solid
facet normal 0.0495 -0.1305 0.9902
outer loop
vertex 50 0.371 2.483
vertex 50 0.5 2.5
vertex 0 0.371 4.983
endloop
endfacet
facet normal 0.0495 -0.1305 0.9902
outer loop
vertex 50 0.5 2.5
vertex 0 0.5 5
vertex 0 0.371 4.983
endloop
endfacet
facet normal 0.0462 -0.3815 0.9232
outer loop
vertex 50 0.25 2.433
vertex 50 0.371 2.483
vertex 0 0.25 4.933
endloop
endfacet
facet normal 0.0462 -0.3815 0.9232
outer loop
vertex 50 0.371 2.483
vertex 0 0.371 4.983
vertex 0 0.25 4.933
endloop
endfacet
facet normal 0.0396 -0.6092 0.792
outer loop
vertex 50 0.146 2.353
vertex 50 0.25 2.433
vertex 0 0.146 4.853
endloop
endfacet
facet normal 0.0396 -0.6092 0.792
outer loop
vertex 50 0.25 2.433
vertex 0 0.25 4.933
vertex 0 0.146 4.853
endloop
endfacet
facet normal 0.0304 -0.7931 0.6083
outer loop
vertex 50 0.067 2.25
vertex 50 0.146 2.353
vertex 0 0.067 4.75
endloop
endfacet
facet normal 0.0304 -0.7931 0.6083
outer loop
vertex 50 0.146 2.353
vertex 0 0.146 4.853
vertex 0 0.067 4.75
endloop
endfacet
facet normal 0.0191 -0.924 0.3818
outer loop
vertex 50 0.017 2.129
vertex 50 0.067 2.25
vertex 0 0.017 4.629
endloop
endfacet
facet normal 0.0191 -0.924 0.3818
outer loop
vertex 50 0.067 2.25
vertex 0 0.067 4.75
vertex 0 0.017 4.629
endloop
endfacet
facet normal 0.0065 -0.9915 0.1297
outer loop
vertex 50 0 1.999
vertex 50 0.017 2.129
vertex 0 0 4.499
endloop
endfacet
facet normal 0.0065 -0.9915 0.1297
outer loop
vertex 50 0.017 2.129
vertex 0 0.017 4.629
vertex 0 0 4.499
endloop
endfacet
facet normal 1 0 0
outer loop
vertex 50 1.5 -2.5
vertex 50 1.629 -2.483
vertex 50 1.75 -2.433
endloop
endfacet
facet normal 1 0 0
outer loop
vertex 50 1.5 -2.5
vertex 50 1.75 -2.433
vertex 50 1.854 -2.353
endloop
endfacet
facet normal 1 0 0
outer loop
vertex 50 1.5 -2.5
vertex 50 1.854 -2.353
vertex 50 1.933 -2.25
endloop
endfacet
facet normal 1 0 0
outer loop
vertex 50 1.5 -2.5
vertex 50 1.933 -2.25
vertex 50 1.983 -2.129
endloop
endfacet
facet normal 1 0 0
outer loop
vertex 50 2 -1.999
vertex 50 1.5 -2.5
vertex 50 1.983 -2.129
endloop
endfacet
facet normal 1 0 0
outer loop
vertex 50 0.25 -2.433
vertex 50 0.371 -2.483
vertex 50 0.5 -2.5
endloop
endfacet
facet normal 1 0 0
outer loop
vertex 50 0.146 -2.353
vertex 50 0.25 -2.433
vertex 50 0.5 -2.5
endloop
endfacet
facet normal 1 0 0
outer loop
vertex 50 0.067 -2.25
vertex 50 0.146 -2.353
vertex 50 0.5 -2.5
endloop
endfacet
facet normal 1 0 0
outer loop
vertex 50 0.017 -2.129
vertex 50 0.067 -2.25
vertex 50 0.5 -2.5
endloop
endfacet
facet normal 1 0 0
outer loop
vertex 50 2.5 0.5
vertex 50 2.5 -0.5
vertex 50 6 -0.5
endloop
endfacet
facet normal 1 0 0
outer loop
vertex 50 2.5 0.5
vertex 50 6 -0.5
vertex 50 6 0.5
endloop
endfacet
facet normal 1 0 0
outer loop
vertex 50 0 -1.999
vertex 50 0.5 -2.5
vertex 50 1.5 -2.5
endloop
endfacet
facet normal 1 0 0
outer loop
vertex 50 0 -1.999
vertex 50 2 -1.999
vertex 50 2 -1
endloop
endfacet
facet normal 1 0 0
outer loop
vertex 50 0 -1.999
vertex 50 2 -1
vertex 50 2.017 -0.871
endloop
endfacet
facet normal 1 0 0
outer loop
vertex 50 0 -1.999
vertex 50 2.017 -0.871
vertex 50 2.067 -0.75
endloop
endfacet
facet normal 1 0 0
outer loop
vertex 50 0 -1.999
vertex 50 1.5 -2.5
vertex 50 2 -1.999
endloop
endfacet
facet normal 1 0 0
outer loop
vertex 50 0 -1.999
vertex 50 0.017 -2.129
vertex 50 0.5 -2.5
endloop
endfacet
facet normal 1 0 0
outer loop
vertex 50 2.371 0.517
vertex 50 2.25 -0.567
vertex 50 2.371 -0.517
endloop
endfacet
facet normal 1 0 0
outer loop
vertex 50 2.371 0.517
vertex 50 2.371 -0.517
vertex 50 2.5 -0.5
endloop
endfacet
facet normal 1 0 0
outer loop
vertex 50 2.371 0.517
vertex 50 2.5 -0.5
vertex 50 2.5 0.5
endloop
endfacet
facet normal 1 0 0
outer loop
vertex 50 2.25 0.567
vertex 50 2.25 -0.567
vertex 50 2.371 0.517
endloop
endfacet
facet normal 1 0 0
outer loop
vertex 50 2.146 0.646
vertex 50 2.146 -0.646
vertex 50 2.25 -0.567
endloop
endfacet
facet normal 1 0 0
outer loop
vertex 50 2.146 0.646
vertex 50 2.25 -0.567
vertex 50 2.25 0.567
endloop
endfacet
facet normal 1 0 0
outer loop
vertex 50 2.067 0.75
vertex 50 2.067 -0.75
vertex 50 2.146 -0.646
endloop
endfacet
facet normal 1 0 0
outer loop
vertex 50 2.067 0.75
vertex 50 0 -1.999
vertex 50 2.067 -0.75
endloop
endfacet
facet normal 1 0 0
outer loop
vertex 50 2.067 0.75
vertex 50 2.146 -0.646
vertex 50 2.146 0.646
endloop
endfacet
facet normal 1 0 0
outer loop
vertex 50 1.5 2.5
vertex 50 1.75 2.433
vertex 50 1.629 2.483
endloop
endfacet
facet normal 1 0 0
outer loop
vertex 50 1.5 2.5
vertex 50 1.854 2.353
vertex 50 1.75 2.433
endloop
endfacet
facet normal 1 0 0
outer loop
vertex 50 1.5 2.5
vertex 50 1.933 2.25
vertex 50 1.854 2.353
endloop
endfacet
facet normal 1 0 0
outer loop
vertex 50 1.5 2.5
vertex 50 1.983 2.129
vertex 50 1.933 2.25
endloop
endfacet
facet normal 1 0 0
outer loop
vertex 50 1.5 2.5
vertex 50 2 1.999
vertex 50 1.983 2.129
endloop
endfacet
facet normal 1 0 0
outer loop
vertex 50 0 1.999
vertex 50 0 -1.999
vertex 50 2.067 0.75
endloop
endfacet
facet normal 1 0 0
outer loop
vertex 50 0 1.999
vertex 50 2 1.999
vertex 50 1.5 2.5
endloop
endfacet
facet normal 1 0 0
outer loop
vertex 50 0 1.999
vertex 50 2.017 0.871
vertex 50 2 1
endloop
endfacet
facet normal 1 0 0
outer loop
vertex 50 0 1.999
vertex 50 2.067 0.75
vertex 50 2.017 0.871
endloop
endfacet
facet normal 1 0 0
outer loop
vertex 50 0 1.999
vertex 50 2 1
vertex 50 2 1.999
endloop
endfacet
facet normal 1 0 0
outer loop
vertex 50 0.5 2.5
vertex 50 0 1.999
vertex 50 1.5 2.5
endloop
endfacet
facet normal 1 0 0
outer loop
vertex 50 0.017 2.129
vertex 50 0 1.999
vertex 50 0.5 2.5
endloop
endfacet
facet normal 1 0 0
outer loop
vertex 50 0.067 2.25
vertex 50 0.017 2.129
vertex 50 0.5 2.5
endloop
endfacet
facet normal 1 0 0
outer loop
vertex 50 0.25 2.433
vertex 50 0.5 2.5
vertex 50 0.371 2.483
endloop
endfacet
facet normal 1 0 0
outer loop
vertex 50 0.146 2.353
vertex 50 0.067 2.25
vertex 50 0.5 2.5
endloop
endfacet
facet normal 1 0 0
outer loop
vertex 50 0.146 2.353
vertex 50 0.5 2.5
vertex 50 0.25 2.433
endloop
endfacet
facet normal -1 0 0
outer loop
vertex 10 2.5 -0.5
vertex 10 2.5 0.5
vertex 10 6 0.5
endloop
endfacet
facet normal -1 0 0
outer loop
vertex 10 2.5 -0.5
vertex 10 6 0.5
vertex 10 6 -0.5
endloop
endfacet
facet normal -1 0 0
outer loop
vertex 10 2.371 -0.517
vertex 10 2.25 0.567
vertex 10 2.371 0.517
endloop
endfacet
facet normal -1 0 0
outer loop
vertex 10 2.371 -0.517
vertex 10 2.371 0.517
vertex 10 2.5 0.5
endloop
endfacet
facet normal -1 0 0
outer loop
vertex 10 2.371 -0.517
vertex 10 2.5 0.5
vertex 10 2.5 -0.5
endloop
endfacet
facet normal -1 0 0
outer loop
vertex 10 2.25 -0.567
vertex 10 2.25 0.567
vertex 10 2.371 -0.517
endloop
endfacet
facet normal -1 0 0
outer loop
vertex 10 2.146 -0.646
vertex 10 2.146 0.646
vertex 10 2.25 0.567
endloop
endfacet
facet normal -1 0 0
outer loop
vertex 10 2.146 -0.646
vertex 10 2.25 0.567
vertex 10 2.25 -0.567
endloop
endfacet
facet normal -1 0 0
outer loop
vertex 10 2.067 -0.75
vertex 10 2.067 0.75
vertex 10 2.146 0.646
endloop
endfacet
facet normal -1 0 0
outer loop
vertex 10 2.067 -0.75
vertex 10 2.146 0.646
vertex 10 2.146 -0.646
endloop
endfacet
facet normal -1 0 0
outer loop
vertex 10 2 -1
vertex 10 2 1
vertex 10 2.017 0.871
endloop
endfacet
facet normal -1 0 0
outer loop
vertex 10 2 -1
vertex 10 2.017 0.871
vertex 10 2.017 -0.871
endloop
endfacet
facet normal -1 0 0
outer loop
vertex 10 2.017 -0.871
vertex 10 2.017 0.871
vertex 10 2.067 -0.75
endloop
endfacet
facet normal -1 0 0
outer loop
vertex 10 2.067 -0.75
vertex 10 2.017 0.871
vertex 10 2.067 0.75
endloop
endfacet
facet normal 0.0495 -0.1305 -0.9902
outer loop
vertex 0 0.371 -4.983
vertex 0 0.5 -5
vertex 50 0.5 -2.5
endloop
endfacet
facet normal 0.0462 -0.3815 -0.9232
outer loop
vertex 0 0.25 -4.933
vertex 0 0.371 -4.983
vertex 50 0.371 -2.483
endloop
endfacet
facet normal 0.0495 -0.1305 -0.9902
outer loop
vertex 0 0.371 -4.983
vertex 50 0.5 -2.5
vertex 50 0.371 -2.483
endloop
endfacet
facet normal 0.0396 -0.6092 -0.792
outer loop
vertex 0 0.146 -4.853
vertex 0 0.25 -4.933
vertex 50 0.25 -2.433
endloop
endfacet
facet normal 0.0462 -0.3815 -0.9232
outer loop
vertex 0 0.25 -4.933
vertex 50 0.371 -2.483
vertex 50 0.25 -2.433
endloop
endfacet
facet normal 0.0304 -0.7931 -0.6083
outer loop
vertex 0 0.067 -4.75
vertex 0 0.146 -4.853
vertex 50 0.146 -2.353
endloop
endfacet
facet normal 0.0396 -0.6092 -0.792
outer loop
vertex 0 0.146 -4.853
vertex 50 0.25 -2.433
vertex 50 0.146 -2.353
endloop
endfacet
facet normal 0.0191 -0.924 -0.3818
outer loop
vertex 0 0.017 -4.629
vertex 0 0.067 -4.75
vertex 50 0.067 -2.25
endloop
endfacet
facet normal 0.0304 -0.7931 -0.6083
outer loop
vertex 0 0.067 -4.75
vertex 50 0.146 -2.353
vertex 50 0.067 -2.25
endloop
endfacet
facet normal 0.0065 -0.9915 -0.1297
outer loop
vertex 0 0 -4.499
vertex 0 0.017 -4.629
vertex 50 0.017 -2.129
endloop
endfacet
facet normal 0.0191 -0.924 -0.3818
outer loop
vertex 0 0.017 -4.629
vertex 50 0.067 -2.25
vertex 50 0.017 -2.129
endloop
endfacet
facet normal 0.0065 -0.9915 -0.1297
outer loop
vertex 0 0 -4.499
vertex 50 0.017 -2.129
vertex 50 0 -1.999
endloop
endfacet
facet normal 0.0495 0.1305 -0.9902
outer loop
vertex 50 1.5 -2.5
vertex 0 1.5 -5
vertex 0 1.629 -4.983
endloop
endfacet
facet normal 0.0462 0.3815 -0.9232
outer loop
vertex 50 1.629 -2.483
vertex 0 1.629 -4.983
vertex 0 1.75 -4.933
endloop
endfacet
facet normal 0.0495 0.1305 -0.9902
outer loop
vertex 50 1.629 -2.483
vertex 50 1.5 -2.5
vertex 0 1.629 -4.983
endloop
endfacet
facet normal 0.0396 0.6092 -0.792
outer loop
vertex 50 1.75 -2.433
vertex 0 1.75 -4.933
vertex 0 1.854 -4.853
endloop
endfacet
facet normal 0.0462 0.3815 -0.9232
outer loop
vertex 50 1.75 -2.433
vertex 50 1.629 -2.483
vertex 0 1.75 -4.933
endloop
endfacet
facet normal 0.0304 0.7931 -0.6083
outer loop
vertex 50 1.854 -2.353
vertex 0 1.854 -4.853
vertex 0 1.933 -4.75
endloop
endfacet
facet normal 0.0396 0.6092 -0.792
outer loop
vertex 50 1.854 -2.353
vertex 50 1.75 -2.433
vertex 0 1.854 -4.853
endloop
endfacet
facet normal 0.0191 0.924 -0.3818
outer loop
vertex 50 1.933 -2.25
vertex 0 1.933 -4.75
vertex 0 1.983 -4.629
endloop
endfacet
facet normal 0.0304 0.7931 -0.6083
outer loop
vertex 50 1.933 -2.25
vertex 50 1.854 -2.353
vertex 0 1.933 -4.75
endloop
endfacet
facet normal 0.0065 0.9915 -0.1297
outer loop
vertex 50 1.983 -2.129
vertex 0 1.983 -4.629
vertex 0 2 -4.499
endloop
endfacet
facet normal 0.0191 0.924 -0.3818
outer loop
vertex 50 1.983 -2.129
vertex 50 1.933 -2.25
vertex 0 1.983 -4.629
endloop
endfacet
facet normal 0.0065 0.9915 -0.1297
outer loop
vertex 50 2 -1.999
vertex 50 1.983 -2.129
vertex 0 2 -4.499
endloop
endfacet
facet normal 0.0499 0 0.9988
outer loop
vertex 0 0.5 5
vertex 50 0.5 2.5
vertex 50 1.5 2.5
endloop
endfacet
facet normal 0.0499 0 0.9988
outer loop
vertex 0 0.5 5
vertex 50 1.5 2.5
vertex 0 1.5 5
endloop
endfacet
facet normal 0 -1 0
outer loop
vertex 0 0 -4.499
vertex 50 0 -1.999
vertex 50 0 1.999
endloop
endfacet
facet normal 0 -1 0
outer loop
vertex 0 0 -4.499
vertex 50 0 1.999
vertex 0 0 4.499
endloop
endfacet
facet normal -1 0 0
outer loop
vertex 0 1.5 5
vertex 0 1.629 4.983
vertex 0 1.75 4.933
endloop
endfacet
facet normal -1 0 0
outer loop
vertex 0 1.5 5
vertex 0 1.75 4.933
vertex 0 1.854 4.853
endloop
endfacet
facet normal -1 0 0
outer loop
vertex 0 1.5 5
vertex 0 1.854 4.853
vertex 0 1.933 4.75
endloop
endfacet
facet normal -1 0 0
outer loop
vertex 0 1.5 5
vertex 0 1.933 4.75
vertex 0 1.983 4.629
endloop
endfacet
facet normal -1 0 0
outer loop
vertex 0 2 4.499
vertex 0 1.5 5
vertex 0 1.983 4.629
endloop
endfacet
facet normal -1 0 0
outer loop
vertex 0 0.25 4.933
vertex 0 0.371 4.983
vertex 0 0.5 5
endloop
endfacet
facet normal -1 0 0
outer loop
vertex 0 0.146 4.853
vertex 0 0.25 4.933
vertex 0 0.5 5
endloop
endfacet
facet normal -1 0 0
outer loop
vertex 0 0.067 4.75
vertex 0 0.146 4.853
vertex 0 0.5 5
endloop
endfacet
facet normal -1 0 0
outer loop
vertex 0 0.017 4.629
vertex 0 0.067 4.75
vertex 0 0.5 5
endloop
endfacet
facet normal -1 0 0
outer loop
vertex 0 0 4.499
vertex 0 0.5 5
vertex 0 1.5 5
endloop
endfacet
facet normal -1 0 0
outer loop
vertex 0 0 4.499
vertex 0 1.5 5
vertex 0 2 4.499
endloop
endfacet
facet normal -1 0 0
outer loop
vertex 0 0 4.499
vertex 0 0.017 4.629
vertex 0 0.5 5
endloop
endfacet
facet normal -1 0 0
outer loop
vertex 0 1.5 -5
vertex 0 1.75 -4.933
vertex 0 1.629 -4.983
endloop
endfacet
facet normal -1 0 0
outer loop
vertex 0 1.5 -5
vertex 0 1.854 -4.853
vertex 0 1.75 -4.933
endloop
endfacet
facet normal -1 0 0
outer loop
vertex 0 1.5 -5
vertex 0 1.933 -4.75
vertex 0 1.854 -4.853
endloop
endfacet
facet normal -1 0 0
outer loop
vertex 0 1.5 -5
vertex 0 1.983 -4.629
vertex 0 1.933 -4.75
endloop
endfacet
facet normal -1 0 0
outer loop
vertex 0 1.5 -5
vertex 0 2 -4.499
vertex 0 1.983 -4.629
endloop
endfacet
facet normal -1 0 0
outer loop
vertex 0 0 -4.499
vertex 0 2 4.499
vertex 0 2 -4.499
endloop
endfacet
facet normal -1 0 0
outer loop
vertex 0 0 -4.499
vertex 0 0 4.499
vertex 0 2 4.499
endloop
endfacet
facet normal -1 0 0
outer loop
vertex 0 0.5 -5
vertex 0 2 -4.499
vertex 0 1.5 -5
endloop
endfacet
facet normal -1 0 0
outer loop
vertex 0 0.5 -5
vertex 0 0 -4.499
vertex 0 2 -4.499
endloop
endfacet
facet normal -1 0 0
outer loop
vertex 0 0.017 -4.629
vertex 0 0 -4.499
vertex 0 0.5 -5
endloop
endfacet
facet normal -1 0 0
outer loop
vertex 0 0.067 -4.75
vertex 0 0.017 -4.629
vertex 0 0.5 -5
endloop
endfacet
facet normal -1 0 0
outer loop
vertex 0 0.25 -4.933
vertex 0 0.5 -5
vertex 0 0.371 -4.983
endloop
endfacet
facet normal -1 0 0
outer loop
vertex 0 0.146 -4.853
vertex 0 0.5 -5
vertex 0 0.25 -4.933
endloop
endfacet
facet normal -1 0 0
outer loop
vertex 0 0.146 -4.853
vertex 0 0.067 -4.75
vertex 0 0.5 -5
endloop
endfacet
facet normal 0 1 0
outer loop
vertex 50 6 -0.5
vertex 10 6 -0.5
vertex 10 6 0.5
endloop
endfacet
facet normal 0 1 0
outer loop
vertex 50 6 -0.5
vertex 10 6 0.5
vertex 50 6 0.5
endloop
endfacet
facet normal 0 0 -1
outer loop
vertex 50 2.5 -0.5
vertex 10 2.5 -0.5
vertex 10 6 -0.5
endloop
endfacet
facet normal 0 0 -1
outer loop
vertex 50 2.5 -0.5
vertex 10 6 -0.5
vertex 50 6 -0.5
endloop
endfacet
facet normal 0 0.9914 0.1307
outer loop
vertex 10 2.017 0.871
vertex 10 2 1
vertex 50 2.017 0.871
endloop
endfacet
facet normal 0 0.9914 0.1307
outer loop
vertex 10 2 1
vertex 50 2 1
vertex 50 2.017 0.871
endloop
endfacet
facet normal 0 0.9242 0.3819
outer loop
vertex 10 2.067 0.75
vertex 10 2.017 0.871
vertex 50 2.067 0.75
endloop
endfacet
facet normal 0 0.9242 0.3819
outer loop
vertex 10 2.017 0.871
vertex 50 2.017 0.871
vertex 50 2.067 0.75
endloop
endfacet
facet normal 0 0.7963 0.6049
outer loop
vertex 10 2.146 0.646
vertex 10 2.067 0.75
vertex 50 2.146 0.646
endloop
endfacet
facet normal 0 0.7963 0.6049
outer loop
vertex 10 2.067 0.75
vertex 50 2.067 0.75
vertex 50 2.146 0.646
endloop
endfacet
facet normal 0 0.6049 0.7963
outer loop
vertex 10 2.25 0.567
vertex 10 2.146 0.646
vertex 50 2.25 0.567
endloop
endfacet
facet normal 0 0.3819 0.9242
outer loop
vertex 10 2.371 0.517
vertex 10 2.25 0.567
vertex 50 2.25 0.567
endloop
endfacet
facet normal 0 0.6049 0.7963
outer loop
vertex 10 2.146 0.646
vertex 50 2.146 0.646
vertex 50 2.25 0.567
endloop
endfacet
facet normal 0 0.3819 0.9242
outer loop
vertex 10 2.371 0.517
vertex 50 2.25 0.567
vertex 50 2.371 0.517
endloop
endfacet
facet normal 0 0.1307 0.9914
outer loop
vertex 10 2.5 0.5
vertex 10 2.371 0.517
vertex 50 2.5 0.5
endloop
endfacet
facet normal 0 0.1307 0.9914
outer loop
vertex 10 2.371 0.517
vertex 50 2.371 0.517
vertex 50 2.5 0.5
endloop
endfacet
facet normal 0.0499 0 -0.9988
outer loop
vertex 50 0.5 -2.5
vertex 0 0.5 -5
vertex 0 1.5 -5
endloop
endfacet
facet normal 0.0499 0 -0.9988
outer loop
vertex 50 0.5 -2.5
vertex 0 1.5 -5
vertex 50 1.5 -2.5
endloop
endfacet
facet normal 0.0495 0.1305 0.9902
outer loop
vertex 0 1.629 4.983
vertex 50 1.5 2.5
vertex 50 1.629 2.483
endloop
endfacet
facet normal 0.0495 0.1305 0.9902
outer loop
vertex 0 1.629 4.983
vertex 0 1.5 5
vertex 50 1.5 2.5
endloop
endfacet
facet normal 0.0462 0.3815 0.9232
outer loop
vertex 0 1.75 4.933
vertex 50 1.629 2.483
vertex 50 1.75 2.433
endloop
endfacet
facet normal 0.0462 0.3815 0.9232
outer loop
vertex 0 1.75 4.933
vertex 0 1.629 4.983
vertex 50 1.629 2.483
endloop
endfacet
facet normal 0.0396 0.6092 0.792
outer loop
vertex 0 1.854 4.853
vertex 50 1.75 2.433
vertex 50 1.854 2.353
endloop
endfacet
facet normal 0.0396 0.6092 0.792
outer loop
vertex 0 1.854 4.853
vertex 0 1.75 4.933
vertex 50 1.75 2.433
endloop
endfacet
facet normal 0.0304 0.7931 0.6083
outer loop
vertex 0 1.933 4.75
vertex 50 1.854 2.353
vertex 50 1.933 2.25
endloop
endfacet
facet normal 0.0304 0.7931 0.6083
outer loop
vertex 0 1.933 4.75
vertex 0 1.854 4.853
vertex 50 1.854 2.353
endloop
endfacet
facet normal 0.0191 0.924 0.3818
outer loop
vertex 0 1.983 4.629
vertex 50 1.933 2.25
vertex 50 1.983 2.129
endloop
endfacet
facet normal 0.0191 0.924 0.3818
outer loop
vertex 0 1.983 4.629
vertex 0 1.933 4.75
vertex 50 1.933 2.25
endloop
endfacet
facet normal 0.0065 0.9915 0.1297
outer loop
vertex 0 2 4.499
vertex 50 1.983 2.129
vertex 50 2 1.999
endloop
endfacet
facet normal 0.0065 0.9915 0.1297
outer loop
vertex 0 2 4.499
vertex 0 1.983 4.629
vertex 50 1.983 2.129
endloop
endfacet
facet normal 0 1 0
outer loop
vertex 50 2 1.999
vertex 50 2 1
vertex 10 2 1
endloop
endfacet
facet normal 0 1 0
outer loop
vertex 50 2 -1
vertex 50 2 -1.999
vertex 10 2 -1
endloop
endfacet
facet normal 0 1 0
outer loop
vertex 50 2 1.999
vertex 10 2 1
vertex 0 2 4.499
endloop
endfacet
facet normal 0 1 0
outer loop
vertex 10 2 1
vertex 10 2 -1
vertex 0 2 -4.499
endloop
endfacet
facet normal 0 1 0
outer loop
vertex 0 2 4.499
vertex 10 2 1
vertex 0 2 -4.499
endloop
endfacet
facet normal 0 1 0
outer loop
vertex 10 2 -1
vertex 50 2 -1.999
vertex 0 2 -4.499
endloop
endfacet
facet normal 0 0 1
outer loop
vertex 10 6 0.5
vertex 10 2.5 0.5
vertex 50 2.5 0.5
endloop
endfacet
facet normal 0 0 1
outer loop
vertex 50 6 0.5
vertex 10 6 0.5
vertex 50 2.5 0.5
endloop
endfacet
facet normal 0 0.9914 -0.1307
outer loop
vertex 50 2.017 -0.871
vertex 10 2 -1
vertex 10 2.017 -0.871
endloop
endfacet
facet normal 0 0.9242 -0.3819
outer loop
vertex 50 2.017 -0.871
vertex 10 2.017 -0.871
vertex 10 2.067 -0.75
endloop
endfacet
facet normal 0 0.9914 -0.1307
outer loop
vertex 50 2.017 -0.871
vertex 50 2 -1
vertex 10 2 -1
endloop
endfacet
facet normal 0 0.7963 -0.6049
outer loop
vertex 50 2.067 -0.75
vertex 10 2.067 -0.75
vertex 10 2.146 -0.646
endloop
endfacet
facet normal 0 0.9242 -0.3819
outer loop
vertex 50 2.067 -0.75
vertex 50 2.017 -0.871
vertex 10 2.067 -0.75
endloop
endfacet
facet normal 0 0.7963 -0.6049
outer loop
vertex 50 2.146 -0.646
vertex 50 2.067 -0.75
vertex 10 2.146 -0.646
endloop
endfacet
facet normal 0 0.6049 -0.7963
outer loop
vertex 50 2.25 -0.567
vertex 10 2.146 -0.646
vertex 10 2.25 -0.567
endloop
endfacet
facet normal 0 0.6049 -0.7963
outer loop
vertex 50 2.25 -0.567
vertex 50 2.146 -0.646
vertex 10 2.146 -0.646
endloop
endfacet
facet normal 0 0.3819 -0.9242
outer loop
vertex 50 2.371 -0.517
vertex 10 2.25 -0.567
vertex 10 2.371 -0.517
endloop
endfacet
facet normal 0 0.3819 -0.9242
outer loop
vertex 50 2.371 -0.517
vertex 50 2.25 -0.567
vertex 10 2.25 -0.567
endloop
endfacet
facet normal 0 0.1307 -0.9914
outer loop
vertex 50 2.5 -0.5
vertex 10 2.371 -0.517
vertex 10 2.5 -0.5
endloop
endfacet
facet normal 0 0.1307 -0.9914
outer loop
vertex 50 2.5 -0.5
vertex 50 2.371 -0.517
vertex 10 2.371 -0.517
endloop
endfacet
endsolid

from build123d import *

# Parameters (mm, degrees)
BOSS_EXTRUDE1_DEPTH = 2
SKETCH2_W           = 40
SKETCH2_H           = 1
BOSS_EXTRUDE2_DEPTH = 4
FILLET1_R           = 0.5


with BuildPart() as part:
    # Sketch1 → Boss-Extrude1 (new body)
    with BuildSketch(Plane(origin=(0, 0, 0), x_dir=(1, 0, 0), z_dir=(0, 1, 0))):
        Polygon((0, -5), (0, 5), (50, 2.5), (50, -2.5), align=None)
    extrude(amount=BOSS_EXTRUDE1_DEPTH)

    # Sketch2 → Boss-Extrude2 (add)
    with BuildSketch(Plane(origin=(0, 2, 0), x_dir=(1, 0, 0), z_dir=(0, 1, 0))):
        with Locations((30, 0)):
            Rectangle(SKETCH2_W, SKETCH2_H)
    extrude(amount=BOSS_EXTRUDE2_DEPTH)

    # Fillet1
    fillet1_edges = [part.edges().sort_by_distance(p)[0] for p in [
        (25, 2, 3.75),
        (30, 2, -0.5),
        (30, 2, 0.5),
        (25, 2, -3.75),
        (25, 0, 3.75),
        (25, 0, -3.75),
    ]]
    fillet(fillet1_edges, radius=FILLET1_R)


solid = part.part
